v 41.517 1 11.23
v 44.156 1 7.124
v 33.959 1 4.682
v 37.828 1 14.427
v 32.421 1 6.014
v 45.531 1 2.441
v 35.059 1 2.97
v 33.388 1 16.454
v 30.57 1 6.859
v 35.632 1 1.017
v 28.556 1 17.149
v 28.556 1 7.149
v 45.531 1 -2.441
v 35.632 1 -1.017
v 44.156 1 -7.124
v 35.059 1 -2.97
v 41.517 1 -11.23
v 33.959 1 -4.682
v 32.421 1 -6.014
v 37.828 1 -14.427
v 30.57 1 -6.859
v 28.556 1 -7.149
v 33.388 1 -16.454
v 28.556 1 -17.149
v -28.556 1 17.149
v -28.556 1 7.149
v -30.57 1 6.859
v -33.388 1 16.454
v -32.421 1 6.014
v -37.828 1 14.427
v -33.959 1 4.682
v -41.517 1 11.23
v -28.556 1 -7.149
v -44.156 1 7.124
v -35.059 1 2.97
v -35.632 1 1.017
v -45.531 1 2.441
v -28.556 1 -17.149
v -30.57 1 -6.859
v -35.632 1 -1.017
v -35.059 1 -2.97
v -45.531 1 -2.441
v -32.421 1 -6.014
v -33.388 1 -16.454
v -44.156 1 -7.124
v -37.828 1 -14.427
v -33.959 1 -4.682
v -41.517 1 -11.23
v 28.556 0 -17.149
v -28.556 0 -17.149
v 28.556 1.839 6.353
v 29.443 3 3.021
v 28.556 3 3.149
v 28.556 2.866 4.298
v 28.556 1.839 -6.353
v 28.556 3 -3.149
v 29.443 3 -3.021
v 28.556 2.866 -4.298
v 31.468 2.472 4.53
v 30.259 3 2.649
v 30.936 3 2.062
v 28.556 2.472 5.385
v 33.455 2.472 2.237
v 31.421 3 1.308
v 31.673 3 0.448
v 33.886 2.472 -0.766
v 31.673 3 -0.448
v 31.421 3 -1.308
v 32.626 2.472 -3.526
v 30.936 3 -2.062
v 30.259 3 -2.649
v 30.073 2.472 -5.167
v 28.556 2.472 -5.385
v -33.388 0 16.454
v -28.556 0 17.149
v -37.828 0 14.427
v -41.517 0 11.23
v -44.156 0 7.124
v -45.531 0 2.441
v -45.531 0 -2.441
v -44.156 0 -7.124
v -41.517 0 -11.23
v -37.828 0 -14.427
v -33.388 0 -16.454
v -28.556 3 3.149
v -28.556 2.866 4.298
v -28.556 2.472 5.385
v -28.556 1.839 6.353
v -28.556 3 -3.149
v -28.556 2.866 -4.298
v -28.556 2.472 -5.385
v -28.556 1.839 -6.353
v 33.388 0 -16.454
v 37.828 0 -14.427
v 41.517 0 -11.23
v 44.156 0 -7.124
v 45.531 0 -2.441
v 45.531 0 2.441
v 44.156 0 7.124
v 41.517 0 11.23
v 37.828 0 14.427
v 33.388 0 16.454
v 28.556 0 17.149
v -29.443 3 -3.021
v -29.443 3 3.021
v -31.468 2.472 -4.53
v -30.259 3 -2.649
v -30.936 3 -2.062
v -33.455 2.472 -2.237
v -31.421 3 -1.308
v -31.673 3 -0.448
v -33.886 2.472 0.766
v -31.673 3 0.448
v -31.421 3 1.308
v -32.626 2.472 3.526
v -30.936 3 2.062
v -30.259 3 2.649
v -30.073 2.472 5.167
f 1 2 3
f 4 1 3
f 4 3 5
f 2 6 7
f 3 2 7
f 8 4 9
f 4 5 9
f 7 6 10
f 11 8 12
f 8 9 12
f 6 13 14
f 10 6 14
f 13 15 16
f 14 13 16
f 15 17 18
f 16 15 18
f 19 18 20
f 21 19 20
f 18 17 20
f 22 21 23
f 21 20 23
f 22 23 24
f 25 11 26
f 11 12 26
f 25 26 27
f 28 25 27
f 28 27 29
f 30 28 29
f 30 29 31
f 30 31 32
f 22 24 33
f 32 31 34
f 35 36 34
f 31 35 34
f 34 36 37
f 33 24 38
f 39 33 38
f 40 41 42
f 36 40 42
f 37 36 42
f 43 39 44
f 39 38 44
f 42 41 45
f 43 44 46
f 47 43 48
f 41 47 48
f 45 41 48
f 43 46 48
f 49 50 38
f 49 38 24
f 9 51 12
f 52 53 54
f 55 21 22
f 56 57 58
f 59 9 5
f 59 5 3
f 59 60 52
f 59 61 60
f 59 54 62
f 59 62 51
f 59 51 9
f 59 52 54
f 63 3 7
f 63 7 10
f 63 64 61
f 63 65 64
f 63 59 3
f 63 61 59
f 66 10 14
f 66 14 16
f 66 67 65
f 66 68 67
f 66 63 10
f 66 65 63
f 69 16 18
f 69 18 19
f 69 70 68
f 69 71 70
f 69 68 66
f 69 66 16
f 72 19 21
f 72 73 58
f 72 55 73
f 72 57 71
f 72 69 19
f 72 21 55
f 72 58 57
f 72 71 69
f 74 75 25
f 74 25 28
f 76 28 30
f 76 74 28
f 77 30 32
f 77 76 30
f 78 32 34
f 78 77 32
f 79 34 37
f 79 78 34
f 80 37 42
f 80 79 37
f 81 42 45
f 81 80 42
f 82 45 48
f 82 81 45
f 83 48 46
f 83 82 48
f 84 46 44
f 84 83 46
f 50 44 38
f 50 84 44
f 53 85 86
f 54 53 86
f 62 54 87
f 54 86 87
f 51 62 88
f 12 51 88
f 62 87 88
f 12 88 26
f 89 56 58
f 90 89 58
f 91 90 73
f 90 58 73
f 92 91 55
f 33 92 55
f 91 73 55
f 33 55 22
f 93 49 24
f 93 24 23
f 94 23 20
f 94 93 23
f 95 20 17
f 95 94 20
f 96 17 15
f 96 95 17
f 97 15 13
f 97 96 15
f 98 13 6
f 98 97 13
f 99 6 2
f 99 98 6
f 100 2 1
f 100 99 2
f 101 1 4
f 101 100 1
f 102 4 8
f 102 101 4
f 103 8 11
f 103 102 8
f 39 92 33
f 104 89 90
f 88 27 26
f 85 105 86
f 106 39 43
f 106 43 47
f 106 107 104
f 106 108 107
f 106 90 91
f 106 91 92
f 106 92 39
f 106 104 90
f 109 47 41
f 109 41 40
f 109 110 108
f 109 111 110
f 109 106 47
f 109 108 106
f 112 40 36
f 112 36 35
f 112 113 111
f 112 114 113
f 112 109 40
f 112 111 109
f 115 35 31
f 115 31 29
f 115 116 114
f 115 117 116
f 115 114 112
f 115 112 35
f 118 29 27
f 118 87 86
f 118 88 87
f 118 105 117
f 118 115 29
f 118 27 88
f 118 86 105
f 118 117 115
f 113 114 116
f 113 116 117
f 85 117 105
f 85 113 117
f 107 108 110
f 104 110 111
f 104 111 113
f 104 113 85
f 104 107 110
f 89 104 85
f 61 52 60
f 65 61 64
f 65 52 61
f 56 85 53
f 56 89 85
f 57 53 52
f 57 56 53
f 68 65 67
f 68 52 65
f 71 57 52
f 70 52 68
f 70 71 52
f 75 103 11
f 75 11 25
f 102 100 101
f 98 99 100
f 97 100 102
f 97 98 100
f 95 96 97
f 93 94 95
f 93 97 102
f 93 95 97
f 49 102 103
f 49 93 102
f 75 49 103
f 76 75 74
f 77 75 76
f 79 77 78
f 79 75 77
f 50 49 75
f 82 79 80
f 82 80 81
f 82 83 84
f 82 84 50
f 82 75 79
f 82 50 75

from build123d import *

# Parameters (mm, degrees)
BOSS_EXTRUDE1_DEPTH = 1
BOSS_EXTRUDE2_DEPTH = 2
FILLET1_R           = 5


with BuildPart() as part:
    # Sketch1 → Boss-Extrude1 (new body)
    with BuildSketch(Plane(origin=(0, 0, 0), x_dir=(1, 0, 0), z_dir=(0, 1, 0))):
        with BuildLine():
            Line((-28.55625, 17.14897587), (28.55625, 17.14897587))
            ThreePointArc((28.55625, 17.14897587), (45.70522587, 0), (28.55625, -17.14897587))
            Line((28.55625, -17.14897587), (-28.55625, -17.14897587))
            ThreePointArc((-28.55625, -17.14897587), (-45.70522587, 0), (-28.55625, 17.14897587))
        make_face()
    extrude(amount=BOSS_EXTRUDE1_DEPTH)

    # Sketch2 → Boss-Extrude2 (add)
    with BuildSketch(Plane(origin=(0, 1, 0), x_dir=(1, 0, 0), z_dir=(0, 1, 0))):
        with BuildLine():
            Line((-28.55625, -7.14897587), (28.55625, -7.14897587))
            ThreePointArc((28.55625, -7.14897587), (35.70522587, 0), (28.55625, 7.14897587))
            Line((28.55625, 7.14897587), (-28.55625, 7.14897587))
            ThreePointArc((-28.55625, 7.14897587), (-35.70522587, 0), (-28.55625, -7.14897587))
        make_face()
    extrude(amount=BOSS_EXTRUDE2_DEPTH)

    # Fillet1
    # the kernel refuses this fillet: 5 mm, written as the material it takes off along each edge
    with BuildSketch(Plane(origin=(28.55625, 3, -7.14897587), x_dir=(0, -1, 0), z_dir=(-1, 0, 0)), Plane(origin=(-28.55625, 3, 7.14897587), x_dir=(0, -1, 0), z_dir=(1, 0, 0))) as fillet1_piece_1:
        with BuildLine():
            CenterArc((5, 4), FILLET1_R, 180, 53.130102354)
            Line((0, 4), (-0.1, 4))
            Line((-0.1, 4), (-0.1, 0))
            Line((-0.1, 0), (0, -0.1))
            ThreePointArc((0, -0.1), (1, -0.1), (1.94, -0.08))
            Line((1.94, -0.08), (2, 0))
        make_face()
    extrude(amount=57.1125, mode=Mode.SUBTRACT)
    with BuildSketch(Plane(origin=(28.55625, 3, 0), x_dir=(0, 0, 1), z_dir=(-1, 0, 0))) as fillet1_piece_2:
        with BuildLine():
            CenterArc((3.14897587, -5), FILLET1_R, 36.869897646, 53.130102354)
            Line((3.14897587, 0), (3.14897587, 0.1))
            Line((3.14897587, 0.1), (7.14897587, 0.1))
            Line((7.14897587, 0.1), (7.24897587, 0))
            ThreePointArc((7.24897587, 0), (7.24897587, -1), (7.22897587, -1.94))
            Line((7.22897587, -1.94), (7.14897587, -2))
        make_face()
    revolve(axis=Axis((28.55625, 3, 0), (0, 1, 0)), revolution_arc=180, mode=Mode.SUBTRACT)
    with BuildSketch(Plane(origin=(-28.55625, 3, 0), x_dir=(0, 0, -1), z_dir=(1, 0, 0))) as fillet1_piece_3:
        with BuildLine():
            CenterArc((3.14897587, -5), FILLET1_R, 36.869897646, 53.130102354)
            Line((3.14897587, 0), (3.14897587, 0.1))
            Line((3.14897587, 0.1), (7.14897587, 0.1))
            Line((7.14897587, 0.1), (7.24897587, 0))
            ThreePointArc((7.24897587, 0), (7.24897587, -1), (7.22897587, -1.94))
            Line((7.22897587, -1.94), (7.14897587, -2))
        make_face()
    revolve(axis=Axis((-28.55625, 3, 0), (0, 1, 0)), revolution_arc=180, mode=Mode.SUBTRACT)


solid = part.part
